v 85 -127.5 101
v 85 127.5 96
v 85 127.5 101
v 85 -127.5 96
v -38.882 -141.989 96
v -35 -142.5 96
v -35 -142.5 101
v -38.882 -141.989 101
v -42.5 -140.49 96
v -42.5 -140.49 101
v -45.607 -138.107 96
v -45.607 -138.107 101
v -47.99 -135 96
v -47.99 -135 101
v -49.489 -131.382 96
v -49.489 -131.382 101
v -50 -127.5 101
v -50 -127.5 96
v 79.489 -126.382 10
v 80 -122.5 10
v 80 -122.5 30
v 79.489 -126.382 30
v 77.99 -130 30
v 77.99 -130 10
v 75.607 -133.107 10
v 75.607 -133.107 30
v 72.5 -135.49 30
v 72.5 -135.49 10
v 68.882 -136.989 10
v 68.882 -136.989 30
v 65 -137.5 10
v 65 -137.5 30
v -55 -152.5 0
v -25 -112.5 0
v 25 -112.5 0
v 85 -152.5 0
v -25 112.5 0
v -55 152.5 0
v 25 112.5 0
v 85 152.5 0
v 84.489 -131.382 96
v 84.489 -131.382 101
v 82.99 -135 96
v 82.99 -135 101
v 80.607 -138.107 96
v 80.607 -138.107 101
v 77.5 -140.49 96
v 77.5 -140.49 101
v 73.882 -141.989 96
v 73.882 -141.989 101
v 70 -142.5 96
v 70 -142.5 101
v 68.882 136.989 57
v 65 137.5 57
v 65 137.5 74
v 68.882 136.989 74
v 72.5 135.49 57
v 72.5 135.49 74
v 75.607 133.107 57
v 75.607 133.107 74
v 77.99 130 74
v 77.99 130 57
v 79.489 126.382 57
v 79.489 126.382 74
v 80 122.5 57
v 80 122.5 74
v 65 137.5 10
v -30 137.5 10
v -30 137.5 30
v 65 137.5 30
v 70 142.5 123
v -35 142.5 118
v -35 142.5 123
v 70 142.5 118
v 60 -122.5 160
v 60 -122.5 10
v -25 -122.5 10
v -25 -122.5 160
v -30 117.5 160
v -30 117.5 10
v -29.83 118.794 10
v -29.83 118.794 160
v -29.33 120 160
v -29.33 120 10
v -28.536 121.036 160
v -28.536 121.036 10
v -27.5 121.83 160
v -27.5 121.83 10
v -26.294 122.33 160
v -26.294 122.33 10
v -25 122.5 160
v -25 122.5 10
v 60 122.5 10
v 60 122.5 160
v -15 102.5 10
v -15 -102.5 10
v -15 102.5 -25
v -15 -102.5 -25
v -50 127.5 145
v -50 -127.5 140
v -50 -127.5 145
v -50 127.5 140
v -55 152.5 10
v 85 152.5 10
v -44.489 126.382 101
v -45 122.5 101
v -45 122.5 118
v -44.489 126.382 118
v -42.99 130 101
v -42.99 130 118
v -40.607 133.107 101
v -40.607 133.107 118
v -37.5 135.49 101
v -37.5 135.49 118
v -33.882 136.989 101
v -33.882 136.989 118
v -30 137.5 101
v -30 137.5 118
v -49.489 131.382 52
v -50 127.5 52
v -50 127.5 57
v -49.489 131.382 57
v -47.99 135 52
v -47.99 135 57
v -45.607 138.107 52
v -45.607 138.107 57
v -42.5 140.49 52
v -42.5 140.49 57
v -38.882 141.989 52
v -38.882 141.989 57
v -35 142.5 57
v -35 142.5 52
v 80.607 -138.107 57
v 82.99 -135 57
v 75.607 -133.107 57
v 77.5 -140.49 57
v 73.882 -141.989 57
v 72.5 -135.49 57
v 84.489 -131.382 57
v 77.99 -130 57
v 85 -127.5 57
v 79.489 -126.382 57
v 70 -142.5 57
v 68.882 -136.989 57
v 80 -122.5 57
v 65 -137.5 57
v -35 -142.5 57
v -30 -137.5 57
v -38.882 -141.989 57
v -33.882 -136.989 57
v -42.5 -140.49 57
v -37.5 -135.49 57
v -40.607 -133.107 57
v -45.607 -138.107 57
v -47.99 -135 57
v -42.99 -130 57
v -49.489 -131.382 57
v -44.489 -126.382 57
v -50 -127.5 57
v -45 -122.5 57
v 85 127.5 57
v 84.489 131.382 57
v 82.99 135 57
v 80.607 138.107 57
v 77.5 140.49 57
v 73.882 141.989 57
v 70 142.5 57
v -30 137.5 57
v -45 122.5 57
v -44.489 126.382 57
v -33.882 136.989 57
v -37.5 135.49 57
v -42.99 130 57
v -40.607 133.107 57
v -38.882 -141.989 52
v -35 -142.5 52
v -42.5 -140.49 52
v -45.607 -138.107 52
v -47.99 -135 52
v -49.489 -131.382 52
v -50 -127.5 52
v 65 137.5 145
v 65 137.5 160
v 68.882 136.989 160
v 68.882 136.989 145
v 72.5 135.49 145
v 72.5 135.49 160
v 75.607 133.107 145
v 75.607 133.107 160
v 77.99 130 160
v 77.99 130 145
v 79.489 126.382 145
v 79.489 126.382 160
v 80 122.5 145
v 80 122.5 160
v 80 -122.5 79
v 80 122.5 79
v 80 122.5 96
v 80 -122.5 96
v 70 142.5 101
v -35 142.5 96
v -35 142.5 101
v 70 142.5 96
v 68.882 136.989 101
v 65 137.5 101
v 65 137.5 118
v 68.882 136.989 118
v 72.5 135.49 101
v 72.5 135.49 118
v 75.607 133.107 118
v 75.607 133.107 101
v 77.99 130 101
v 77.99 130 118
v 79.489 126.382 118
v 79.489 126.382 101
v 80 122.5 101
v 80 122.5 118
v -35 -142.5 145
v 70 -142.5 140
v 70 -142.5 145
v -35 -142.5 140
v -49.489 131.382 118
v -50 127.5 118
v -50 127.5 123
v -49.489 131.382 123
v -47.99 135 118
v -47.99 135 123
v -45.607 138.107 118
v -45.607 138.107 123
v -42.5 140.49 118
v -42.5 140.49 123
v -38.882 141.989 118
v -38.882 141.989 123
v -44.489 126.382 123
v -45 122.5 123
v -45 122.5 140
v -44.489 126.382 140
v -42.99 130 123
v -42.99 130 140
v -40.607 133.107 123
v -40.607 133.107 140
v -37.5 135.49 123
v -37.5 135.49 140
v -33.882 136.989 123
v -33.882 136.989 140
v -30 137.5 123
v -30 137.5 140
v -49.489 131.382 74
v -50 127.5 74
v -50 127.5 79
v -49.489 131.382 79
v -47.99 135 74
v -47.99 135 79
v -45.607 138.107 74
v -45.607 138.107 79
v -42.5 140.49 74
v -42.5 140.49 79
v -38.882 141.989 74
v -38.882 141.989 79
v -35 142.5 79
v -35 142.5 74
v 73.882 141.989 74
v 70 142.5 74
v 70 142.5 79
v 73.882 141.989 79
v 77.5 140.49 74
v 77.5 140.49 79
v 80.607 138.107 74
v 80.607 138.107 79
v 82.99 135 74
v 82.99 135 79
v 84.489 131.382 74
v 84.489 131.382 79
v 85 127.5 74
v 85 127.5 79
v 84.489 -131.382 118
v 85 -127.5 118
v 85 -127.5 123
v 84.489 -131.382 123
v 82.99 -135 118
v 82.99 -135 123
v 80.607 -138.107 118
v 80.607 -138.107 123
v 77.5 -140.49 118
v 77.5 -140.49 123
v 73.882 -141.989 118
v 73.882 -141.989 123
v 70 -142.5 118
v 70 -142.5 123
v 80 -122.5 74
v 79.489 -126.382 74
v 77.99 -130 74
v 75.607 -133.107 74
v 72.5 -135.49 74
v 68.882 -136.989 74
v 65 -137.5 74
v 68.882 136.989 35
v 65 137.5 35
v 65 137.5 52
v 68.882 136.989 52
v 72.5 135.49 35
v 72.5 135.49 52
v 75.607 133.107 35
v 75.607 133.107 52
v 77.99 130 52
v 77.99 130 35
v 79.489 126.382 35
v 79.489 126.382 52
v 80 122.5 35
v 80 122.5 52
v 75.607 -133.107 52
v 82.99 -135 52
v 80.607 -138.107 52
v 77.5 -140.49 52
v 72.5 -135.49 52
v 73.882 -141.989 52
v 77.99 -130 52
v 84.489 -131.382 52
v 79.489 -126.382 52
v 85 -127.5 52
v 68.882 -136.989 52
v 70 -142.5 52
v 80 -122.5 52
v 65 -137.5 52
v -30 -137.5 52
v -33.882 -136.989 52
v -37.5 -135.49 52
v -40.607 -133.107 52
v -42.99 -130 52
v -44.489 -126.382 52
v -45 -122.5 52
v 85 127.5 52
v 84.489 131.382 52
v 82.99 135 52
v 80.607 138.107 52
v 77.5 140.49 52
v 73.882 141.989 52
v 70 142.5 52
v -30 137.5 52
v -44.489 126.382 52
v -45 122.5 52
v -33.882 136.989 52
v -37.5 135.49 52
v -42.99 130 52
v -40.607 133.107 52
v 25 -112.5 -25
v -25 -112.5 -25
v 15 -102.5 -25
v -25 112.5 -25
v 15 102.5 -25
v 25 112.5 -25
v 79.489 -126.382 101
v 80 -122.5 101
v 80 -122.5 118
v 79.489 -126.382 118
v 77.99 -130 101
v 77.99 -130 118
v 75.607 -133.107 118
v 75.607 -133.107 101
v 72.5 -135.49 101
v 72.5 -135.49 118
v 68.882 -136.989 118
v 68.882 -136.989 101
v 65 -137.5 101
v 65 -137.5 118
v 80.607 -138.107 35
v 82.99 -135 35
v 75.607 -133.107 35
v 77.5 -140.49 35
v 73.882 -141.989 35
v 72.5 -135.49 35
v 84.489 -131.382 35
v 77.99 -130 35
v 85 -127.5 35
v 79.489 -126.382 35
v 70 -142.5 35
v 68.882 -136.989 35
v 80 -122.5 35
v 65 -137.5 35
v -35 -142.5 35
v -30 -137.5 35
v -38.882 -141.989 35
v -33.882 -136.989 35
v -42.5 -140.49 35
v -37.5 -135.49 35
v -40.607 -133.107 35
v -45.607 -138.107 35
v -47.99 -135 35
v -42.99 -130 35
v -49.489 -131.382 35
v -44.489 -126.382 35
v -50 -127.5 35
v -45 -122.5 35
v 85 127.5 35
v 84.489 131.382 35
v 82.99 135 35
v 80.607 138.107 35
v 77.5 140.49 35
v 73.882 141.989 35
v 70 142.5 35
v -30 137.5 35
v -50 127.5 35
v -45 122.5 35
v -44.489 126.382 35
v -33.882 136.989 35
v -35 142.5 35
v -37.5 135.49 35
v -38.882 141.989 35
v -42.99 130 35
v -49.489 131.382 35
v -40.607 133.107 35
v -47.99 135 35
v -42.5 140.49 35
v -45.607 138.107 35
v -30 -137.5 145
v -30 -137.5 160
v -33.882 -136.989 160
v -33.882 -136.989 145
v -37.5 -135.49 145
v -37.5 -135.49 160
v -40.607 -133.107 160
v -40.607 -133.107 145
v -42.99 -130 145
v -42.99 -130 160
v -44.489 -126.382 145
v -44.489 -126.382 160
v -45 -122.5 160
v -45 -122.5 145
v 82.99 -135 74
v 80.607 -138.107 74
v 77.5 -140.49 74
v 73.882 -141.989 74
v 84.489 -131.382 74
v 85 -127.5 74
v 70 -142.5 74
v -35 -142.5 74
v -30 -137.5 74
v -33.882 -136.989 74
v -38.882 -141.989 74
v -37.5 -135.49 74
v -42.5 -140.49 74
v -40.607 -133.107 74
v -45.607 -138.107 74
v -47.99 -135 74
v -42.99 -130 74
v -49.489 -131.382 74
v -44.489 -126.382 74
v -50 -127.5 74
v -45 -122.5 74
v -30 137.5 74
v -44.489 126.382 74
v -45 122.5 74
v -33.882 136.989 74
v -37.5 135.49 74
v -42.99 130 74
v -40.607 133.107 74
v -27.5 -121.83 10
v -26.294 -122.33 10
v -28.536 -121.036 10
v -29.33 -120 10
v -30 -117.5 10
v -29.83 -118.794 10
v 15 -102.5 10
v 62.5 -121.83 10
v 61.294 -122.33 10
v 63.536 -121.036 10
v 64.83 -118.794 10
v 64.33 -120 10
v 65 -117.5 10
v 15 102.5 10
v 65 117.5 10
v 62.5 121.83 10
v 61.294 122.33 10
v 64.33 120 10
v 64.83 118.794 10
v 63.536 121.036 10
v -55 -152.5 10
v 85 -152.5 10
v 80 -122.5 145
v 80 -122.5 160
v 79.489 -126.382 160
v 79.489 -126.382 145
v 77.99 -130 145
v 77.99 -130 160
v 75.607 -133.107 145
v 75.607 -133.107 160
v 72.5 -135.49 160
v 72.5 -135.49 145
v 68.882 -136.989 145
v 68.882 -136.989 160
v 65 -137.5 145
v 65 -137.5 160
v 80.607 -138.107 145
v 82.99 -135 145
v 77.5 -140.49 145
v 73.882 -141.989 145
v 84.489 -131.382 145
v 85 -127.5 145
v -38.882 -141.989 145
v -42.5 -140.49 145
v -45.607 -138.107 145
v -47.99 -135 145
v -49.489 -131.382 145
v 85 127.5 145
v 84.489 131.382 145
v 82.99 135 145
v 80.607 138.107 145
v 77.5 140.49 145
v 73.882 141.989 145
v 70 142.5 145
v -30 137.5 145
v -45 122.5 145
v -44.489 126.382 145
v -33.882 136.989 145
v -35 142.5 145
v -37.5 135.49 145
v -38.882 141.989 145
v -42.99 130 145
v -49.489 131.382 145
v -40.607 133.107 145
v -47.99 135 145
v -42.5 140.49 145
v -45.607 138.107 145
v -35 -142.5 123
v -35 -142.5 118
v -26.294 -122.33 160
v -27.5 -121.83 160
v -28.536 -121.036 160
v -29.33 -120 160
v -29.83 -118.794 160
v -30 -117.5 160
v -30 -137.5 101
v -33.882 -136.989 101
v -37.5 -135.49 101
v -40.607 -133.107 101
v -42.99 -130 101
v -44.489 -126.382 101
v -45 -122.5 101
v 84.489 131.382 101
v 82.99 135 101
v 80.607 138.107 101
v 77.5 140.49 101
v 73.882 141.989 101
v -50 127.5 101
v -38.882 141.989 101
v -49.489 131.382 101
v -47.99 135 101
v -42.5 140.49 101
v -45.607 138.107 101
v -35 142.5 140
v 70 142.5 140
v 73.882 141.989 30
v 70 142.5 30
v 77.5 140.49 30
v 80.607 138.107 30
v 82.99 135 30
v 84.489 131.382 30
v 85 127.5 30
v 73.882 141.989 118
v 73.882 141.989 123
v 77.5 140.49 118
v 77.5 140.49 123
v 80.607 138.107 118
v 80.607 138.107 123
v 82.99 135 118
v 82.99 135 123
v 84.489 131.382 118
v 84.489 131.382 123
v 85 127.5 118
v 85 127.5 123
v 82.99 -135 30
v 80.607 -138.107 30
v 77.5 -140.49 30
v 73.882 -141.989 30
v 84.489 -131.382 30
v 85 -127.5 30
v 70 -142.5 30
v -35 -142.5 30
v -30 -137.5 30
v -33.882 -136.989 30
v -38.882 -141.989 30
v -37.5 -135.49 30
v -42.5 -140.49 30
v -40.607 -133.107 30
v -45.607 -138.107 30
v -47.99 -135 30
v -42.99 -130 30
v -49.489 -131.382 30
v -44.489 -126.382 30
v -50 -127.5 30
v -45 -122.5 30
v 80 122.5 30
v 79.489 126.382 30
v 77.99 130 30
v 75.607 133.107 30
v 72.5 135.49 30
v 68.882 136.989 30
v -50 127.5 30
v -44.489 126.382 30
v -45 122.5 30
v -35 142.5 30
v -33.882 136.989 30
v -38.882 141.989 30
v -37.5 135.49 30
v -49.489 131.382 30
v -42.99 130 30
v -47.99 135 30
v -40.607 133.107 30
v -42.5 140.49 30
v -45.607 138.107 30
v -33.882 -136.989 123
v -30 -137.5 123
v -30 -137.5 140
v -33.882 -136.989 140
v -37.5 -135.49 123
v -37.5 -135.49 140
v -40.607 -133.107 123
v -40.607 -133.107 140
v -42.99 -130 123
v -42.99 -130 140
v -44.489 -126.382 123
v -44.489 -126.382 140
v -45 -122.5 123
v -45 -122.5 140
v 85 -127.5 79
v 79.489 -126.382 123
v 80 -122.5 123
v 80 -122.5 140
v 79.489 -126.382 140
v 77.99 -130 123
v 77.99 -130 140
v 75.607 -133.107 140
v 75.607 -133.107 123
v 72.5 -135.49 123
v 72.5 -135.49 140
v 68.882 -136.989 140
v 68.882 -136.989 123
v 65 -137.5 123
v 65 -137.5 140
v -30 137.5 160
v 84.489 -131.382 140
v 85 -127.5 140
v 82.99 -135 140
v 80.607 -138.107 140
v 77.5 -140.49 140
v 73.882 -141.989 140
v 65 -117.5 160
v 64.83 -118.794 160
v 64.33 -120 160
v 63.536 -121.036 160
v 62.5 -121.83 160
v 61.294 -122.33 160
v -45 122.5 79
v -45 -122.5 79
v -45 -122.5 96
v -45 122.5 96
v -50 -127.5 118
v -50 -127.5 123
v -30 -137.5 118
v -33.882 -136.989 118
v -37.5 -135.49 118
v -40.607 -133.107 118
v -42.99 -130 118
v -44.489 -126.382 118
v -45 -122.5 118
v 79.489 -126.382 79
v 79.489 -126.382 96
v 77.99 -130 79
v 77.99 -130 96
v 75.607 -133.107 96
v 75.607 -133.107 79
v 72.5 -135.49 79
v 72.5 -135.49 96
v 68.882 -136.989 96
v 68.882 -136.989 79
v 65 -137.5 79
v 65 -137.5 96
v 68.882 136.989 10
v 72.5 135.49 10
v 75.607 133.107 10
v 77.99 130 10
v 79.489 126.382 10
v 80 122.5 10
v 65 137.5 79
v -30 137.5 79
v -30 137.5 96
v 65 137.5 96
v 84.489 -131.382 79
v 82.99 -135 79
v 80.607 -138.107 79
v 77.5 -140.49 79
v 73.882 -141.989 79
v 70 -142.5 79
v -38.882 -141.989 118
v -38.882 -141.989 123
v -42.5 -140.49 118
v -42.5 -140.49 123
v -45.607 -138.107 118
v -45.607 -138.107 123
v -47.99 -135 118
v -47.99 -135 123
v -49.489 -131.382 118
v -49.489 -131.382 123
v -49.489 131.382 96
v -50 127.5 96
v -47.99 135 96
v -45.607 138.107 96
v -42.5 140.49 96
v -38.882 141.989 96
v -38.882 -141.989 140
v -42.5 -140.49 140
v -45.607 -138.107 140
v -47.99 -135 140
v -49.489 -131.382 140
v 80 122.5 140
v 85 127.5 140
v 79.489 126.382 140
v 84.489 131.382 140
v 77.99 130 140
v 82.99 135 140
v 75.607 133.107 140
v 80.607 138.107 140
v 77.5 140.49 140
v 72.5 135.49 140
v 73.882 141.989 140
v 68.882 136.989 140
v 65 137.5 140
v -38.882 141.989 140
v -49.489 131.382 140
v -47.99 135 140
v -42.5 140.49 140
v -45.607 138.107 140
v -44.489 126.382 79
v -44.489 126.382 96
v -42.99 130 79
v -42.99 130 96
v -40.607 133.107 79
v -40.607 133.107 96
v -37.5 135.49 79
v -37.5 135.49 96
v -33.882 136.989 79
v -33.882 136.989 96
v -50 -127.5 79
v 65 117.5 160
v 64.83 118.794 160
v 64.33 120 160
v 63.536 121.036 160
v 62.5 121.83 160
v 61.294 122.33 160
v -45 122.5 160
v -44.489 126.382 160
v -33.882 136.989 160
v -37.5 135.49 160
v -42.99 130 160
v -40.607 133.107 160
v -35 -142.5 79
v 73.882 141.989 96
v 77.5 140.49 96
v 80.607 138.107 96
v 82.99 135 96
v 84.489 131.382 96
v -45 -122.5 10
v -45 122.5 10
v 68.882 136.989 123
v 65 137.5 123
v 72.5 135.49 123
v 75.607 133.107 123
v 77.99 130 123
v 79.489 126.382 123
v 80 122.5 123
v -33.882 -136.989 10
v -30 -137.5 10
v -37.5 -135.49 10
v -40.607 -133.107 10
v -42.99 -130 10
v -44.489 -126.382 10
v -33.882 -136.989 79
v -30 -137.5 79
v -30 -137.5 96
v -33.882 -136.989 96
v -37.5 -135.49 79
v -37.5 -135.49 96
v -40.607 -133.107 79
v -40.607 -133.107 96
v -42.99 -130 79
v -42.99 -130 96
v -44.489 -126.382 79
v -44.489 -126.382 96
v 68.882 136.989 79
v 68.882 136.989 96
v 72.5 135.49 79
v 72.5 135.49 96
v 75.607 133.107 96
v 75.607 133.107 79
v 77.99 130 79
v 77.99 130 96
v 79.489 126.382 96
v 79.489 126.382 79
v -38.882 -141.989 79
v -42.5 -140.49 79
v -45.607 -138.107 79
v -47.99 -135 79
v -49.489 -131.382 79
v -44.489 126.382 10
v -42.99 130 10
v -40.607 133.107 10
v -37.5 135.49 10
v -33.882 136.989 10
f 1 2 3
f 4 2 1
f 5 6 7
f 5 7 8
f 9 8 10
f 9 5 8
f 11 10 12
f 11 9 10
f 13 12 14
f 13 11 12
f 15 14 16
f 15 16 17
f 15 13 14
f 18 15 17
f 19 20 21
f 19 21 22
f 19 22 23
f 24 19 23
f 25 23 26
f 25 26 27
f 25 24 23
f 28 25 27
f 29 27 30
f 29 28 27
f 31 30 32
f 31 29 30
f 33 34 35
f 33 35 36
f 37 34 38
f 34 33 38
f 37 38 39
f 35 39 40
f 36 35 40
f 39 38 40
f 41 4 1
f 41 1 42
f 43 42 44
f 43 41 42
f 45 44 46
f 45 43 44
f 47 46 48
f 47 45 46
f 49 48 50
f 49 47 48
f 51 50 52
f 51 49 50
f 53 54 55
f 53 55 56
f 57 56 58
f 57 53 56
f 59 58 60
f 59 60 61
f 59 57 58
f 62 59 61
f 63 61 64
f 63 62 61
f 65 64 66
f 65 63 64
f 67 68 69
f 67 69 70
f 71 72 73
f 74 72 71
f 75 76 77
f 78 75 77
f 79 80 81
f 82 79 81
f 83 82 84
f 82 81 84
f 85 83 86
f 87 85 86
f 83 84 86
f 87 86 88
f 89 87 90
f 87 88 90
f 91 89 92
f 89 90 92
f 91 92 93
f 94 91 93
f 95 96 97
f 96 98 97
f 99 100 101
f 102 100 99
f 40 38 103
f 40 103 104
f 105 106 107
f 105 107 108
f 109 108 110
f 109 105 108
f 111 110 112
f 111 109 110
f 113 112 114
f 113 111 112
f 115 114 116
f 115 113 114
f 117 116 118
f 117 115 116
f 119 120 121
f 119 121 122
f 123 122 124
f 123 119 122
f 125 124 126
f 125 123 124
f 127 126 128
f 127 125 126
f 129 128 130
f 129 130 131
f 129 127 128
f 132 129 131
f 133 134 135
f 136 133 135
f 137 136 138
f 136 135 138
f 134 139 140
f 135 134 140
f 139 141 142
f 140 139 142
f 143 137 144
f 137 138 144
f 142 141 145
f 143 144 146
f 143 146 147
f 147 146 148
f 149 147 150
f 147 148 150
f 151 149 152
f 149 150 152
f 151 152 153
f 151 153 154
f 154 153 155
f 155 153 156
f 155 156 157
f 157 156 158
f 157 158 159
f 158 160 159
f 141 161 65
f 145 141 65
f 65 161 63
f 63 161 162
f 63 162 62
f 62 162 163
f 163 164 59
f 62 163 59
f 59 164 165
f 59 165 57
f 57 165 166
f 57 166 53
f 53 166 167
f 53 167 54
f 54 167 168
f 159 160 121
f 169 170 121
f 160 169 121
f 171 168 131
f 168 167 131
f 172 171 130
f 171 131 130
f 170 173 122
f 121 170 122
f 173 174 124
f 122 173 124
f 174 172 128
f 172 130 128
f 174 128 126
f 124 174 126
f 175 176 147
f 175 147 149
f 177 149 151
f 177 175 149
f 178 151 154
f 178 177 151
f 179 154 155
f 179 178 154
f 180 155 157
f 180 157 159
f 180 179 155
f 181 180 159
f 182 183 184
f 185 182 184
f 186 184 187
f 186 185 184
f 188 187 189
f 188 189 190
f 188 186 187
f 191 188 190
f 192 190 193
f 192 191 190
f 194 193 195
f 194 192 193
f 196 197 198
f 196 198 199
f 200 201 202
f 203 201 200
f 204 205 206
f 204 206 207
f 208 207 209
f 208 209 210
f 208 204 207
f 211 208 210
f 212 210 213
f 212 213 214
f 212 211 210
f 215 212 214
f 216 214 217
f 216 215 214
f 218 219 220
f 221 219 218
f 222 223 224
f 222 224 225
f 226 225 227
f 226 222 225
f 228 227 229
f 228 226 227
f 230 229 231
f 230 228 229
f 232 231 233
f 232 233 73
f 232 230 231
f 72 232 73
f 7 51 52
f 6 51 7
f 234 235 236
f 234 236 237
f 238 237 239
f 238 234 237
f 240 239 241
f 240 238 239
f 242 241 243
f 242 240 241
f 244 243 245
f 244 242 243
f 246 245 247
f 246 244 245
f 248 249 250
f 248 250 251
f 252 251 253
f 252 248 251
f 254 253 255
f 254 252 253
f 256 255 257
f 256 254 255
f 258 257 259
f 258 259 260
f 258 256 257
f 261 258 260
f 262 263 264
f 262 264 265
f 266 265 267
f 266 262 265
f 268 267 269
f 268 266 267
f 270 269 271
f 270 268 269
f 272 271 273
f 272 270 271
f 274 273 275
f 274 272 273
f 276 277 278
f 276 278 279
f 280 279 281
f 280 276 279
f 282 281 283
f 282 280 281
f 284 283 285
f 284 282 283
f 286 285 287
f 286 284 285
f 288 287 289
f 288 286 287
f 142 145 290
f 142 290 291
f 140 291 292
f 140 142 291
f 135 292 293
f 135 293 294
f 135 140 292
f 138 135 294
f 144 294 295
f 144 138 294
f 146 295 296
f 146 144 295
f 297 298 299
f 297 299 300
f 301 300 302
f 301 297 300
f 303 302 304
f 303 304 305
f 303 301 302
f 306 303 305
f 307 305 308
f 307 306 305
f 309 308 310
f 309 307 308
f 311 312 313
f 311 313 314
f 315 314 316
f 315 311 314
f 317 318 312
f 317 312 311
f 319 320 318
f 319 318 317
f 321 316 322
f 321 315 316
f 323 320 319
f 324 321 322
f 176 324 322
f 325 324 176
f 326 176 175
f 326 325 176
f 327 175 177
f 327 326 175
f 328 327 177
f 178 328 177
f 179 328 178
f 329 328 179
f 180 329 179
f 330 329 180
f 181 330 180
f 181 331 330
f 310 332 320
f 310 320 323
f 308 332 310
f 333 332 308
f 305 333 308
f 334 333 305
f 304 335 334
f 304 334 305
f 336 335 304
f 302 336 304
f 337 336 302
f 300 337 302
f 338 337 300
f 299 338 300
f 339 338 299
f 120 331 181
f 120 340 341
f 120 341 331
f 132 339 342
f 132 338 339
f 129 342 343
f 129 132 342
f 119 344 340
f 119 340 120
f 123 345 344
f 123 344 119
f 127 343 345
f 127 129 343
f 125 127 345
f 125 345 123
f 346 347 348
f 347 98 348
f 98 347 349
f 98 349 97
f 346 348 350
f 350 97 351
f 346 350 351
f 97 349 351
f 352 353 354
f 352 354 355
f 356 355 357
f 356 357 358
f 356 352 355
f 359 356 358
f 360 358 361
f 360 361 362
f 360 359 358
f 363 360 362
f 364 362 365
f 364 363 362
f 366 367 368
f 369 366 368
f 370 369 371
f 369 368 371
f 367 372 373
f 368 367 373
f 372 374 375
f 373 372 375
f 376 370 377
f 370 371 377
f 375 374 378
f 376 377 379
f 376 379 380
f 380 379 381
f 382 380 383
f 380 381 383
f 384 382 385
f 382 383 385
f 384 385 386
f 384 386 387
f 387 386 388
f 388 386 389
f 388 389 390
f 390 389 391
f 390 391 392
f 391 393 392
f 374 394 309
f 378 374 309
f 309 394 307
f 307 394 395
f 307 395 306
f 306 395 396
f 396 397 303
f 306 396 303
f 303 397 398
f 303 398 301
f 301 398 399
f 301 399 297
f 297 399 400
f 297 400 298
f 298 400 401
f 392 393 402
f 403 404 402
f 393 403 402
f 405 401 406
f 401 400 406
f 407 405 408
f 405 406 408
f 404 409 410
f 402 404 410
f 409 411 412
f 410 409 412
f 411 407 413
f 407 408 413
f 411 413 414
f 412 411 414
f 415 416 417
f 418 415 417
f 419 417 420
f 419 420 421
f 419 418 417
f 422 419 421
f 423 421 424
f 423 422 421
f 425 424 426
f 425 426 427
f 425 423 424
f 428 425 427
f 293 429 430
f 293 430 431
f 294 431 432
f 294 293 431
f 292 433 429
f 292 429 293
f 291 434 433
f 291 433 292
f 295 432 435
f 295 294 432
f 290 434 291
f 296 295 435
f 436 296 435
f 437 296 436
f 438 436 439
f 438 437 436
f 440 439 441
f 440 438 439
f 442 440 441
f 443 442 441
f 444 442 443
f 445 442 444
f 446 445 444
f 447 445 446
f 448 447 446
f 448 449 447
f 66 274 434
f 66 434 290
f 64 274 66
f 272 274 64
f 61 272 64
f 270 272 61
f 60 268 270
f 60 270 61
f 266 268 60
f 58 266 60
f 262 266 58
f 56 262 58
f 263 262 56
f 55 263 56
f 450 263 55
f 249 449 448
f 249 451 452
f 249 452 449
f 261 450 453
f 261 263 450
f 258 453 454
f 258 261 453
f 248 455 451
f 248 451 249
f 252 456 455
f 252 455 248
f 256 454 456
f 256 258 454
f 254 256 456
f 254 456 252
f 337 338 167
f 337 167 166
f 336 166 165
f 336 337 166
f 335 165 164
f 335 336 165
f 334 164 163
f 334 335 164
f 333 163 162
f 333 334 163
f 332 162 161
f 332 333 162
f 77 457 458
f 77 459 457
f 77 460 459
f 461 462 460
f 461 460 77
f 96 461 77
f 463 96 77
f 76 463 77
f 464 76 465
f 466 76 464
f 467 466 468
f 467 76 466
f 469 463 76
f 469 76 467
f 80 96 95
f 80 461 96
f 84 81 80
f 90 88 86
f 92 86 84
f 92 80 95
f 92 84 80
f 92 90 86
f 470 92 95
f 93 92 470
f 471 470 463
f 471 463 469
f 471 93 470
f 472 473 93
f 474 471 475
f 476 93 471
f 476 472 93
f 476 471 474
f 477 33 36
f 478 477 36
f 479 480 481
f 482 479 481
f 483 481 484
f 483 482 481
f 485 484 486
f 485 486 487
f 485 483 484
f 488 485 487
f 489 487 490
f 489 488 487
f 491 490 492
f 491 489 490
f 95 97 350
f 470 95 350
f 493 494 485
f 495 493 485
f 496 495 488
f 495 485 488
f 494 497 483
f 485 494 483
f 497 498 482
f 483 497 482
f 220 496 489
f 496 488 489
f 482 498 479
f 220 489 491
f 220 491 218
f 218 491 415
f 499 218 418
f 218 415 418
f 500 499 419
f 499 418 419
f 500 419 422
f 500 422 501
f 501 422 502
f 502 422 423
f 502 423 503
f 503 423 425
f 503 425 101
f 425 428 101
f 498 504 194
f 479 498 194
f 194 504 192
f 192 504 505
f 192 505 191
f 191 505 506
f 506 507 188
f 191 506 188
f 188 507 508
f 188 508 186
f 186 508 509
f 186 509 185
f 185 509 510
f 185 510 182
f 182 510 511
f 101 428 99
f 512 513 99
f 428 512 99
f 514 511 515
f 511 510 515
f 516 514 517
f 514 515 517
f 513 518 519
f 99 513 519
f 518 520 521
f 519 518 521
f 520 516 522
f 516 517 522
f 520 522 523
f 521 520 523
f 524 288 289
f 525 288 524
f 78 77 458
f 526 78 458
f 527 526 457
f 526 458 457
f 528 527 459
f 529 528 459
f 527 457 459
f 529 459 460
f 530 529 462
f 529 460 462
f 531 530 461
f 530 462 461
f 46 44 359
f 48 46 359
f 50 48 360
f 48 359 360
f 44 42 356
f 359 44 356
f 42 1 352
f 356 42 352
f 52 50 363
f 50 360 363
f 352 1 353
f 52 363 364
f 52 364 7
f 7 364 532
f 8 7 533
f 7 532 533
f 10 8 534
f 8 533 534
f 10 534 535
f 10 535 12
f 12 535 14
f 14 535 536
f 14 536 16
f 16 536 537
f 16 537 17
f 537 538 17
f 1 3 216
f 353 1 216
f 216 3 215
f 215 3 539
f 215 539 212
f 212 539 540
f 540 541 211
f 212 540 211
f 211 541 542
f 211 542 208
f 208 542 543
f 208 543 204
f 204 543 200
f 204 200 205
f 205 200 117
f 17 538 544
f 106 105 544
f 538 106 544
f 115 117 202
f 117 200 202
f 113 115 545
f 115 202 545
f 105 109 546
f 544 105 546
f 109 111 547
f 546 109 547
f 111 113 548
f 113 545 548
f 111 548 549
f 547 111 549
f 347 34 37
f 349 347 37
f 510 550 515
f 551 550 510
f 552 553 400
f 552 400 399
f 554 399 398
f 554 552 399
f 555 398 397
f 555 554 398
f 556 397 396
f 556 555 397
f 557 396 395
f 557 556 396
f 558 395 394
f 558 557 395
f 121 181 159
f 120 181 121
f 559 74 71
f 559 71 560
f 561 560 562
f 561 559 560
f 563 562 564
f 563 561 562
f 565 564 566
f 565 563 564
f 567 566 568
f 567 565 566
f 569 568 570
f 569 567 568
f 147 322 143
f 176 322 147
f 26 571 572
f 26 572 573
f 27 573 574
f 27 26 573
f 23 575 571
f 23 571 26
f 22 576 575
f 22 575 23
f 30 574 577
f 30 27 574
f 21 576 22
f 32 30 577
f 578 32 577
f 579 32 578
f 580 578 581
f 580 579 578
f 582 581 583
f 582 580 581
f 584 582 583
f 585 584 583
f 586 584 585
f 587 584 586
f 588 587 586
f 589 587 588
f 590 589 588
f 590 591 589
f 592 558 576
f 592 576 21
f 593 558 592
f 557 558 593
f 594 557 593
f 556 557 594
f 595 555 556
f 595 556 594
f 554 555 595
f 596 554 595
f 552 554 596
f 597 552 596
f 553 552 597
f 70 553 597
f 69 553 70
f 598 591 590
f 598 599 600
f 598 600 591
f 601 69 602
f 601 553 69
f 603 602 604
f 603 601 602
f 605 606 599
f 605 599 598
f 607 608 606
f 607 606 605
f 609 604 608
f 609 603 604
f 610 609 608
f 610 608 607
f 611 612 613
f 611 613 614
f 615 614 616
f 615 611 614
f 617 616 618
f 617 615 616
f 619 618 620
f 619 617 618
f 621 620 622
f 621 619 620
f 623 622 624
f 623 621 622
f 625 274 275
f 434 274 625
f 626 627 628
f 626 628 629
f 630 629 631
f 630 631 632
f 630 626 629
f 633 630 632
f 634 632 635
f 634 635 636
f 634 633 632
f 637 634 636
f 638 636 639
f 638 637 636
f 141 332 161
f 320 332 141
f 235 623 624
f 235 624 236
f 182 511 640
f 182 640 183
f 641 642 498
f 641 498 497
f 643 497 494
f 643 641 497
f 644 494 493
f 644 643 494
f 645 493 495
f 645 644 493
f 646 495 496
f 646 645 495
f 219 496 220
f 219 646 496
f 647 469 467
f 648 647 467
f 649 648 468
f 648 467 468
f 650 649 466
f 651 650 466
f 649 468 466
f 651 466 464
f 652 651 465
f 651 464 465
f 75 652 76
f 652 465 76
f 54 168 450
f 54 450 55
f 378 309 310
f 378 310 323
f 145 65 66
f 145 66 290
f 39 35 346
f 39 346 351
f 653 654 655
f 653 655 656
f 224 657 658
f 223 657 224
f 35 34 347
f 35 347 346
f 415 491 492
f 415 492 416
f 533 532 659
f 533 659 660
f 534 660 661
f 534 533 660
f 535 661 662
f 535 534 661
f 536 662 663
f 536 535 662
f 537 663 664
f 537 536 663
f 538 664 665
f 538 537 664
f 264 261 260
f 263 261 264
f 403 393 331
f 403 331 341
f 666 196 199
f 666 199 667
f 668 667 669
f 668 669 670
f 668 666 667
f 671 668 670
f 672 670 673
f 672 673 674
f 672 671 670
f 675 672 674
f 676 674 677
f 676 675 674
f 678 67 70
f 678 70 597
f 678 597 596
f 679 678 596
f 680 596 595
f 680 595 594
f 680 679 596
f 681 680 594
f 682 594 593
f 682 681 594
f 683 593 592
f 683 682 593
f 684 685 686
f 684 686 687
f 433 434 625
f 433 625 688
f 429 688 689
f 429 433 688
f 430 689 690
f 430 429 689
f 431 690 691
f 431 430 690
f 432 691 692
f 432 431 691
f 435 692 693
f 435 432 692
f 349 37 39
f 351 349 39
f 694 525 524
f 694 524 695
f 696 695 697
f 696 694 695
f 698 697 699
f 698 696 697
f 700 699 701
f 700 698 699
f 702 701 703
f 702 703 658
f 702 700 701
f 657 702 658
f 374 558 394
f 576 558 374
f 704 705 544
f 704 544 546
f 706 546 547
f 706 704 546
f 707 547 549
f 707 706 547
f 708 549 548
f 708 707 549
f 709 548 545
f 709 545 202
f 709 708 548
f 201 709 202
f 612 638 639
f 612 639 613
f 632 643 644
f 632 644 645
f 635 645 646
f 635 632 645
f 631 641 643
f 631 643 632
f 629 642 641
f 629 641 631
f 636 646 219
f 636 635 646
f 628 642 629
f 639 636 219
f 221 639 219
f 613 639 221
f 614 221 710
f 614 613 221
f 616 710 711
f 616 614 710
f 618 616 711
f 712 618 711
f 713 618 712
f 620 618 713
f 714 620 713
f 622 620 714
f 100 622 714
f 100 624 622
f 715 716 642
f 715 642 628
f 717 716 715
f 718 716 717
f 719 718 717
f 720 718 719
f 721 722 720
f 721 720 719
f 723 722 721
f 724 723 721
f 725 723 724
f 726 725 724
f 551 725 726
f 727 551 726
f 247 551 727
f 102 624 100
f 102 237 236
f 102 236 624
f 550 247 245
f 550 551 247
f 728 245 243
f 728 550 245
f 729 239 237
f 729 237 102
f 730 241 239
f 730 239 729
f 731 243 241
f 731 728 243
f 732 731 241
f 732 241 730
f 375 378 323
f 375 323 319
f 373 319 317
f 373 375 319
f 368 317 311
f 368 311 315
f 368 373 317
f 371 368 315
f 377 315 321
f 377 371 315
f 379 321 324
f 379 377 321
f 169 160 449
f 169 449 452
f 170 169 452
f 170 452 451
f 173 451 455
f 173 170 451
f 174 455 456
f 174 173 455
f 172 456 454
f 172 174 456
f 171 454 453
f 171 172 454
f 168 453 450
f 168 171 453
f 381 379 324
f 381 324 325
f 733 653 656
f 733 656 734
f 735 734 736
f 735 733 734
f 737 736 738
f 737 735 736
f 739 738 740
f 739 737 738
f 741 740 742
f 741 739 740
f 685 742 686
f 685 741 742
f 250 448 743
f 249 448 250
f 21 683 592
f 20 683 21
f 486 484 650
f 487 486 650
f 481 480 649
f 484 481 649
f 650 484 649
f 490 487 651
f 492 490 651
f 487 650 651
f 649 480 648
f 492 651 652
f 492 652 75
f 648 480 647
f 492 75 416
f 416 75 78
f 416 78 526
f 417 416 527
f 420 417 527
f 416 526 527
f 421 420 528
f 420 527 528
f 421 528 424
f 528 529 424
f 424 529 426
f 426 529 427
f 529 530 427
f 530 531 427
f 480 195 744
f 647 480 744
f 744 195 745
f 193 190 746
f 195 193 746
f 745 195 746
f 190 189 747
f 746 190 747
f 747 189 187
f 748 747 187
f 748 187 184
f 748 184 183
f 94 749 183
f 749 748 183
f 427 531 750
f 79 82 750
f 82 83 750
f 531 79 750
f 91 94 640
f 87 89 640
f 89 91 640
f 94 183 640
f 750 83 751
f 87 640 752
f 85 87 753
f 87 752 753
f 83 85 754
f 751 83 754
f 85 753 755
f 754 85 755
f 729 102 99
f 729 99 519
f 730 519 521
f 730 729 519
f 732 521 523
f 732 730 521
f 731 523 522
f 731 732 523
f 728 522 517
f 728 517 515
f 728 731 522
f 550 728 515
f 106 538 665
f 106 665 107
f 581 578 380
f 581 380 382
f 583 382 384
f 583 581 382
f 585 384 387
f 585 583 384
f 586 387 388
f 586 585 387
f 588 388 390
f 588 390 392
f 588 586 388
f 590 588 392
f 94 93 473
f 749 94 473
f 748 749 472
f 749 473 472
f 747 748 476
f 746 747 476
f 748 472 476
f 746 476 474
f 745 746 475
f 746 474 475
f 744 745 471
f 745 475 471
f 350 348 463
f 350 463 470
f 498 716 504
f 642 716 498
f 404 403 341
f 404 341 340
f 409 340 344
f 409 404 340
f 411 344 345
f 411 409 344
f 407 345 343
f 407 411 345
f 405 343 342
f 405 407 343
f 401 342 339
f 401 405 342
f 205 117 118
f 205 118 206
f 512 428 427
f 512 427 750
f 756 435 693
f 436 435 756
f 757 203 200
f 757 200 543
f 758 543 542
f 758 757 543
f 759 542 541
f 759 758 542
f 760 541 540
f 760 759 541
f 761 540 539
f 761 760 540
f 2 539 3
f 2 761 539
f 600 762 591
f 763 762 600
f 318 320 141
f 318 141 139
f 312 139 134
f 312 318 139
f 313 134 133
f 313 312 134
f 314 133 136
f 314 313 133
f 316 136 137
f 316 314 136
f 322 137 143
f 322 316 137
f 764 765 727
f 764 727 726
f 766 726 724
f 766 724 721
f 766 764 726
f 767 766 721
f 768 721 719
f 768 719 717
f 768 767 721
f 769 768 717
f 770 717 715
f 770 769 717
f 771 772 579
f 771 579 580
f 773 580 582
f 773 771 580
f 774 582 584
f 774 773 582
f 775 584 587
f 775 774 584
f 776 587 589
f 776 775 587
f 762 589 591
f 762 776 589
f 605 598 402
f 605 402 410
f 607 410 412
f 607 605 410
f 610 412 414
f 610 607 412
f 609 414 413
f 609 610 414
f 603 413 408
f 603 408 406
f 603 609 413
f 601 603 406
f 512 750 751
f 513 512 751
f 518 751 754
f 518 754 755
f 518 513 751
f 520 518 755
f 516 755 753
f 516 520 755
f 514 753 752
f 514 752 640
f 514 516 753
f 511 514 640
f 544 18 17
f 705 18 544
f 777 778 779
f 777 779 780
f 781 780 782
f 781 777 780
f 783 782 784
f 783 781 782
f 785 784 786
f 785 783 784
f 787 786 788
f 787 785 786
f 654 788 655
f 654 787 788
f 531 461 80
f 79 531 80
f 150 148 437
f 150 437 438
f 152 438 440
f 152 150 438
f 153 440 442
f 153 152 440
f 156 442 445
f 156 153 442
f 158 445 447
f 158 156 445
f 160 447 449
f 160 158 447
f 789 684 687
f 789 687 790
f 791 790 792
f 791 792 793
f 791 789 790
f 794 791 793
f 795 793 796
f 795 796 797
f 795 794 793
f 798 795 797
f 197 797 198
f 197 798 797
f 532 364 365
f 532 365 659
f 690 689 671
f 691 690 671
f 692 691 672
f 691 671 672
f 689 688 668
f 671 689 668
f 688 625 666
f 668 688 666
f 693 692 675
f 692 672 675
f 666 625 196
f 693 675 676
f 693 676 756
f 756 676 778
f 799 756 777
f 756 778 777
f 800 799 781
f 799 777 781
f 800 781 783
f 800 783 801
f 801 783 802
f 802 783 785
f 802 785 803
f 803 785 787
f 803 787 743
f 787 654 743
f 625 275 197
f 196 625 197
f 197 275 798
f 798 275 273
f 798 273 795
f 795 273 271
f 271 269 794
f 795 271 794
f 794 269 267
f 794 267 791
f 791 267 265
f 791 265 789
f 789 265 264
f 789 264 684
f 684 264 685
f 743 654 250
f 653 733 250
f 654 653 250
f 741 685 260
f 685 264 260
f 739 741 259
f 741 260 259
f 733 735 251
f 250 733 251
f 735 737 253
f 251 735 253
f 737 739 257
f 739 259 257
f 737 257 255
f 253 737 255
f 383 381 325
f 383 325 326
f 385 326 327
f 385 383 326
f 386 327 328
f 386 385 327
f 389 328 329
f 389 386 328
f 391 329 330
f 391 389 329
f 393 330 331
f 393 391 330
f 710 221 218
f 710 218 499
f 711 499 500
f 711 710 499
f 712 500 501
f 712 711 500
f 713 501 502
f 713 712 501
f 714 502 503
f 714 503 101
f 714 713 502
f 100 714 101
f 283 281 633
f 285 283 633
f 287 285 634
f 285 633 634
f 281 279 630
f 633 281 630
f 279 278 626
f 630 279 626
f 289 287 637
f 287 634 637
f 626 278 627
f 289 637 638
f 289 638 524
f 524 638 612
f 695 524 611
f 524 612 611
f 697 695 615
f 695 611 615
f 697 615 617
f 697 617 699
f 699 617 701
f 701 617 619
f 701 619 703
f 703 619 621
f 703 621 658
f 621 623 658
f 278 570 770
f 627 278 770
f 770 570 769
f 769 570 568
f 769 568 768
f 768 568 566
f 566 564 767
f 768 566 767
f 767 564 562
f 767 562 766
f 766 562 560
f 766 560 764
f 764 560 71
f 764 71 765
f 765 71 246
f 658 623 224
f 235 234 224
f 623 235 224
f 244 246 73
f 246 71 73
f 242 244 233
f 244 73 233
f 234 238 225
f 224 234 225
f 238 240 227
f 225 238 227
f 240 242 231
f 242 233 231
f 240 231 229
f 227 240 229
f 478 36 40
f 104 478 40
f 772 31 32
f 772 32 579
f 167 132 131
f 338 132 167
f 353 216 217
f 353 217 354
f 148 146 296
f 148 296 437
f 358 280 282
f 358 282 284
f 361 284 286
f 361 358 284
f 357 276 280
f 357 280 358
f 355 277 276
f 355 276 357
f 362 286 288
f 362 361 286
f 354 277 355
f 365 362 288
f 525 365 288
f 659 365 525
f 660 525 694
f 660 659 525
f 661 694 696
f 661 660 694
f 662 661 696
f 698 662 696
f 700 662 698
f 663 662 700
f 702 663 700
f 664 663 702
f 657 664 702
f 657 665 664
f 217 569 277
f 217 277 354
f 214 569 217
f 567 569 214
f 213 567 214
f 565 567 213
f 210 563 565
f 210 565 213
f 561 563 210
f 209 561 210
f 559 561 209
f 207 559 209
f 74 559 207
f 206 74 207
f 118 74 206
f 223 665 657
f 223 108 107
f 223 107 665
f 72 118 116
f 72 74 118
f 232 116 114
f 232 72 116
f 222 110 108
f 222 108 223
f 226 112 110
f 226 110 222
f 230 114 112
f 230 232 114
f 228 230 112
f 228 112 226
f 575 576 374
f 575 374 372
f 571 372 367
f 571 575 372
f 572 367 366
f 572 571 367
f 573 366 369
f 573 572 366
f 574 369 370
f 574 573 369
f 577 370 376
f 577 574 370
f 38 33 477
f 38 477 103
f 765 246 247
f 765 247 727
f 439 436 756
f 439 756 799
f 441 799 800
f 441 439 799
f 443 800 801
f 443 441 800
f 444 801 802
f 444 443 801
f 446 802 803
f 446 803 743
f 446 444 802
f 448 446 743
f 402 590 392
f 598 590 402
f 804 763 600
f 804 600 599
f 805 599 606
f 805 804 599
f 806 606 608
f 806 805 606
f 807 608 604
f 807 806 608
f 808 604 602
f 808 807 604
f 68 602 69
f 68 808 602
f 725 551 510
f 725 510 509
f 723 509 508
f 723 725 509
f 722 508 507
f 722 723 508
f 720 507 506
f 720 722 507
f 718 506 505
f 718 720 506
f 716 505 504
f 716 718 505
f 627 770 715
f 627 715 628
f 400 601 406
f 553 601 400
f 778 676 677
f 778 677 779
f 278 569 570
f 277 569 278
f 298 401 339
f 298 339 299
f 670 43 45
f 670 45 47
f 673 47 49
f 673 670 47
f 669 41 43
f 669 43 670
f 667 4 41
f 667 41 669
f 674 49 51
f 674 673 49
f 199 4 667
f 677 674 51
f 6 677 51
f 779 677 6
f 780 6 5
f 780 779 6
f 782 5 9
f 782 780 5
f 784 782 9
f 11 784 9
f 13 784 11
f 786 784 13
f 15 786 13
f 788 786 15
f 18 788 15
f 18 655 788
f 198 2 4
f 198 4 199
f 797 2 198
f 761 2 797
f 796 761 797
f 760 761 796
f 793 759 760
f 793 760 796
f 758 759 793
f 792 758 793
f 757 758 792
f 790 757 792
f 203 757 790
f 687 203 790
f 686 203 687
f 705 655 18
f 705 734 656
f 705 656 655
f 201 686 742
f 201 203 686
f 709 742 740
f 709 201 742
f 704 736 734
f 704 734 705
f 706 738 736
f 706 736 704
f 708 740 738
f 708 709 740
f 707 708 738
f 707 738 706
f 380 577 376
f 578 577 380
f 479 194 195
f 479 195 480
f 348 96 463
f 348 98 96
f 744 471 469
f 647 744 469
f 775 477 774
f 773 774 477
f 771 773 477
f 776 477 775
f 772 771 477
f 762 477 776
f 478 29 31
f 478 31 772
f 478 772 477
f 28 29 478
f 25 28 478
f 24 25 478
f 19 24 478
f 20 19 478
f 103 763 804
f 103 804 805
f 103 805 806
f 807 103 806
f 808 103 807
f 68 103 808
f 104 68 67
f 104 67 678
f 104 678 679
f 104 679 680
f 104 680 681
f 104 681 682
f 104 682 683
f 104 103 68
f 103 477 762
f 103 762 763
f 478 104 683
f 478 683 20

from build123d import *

# Parameters (mm, degrees)
SKETCH2_W           = 50
SKETCH2_H           = 225
SKETCH2_W_2         = 30
SKETCH2_H_2         = 205
BOSS_EXTRUDE1_DEPTH = 25
SKETCH3_W           = 140
SKETCH3_H           = 305
SKETCH3_W_2         = 30
SKETCH3_H_2         = 205
BOSS_EXTRUDE2_DEPTH = 10
BOSS_EXTRUDE3_DEPTH = 150
BOSS_EXTRUDE4_START = 20
BOSS_EXTRUDE4_DEPTH = 5
LPATTERN1_COUNT     = 6
LPATTERN1_PITCH     = 22


with BuildPart() as part:
    # Sketch2 → Boss-Extrude1 (new body)
    with BuildSketch(Plane.XY):
        Rectangle(SKETCH2_W, SKETCH2_H)
        Rectangle(SKETCH2_W_2, SKETCH2_H_2, mode=Mode.SUBTRACT)
    extrude(amount=-BOSS_EXTRUDE1_DEPTH)

    # Sketch3 → Boss-Extrude2 (add)
    with BuildSketch(Plane.XY):
        with Locations((15, 0)):
            Rectangle(SKETCH3_W, SKETCH3_H)
        Rectangle(SKETCH3_W_2, SKETCH3_H_2, mode=Mode.SUBTRACT)
    extrude(amount=BOSS_EXTRUDE2_DEPTH)

    # Sketch4 → Boss-Extrude3 (add)
    with BuildSketch(Plane.XY.offset(10)):
        with BuildLine():
            Line((-30, 137.5), (65, 137.5))
            ThreePointArc((65, 137.5), (75.606601718, 133.106601718), (80, 122.5))
            Line((80, 122.5), (80, -122.5))
            ThreePointArc((80, -122.5), (75.606601718, -133.106601718), (65, -137.5))
            Line((65, -137.5), (-30, -137.5))
            ThreePointArc((-30, -137.5), (-40.606601718, -133.106601718), (-45, -122.5))
            Line((-45, -122.5), (-45, 122.5))
            ThreePointArc((-45, 122.5), (-40.606601718, 133.106601718), (-30, 137.5))
        make_face()
        with BuildLine():
            Line((-25, 122.5), (60, 122.5))
            ThreePointArc((60, 122.5), (63.535533906, 121.035533906), (65, 117.5))
            Line((65, 117.5), (65, -117.5))
            ThreePointArc((65, -117.5), (63.535533906, -121.035533906), (60, -122.5))
            Line((60, -122.5), (-25, -122.5))
            ThreePointArc((-25, -122.5), (-28.535533906, -121.035533906), (-30, -117.5))
            Line((-30, -117.5), (-30, 117.5))
            ThreePointArc((-30, 117.5), (-28.535533906, 121.035533906), (-25, 122.5))
        make_face(mode=Mode.SUBTRACT)
    extrude(amount=BOSS_EXTRUDE3_DEPTH)

    # Sketch5 → Boss-Extrude4 (add)
    with BuildSketch(Plane.XY.offset(10).offset(BOSS_EXTRUDE4_START)):
        with BuildLine():
            Line((-35, 142.5), (70, 142.5))
            ThreePointArc((70, 142.5), (80.606601718, 138.106601718), (85, 127.5))
            Line((85, 127.5), (85, -127.5))
            ThreePointArc((85, -127.5), (80.606601718, -138.106601718), (70, -142.5))
            Line((70, -142.5), (-35, -142.5))
            ThreePointArc((-35, -142.5), (-45.606601718, -138.106601718), (-50, -127.5))
            Line((-50, -127.5), (-50, 127.5))
            ThreePointArc((-50, 127.5), (-45.606601718, 138.106601718), (-35, 142.5))
        make_face()
        with BuildLine():
            Line((-30, 137.5), (65, 137.5))
            ThreePointArc((65, 137.5), (75.606601718, 133.106601718), (80, 122.5))
            Line((80, 122.5), (80, -122.5))
            ThreePointArc((80, -122.5), (75.606601718, -133.106601718), (65, -137.5))
            Line((65, -137.5), (-30, -137.5))
            ThreePointArc((-30, -137.5), (-40.606601718, -133.106601718), (-45, -122.5))
            Line((-45, -122.5), (-45, 122.5))
            ThreePointArc((-45, 122.5), (-40.606601718, 133.106601718), (-30, 137.5))
        make_face(mode=Mode.SUBTRACT)
    boss_extrude4 = extrude(amount=BOSS_EXTRUDE4_DEPTH)

    # LPattern1: Boss-Extrude4 ×6
    with Locations(*[(0, 0, i * LPATTERN1_PITCH) for i in range(1, LPATTERN1_COUNT)]):
        add(boss_extrude4)


solid = part.part
